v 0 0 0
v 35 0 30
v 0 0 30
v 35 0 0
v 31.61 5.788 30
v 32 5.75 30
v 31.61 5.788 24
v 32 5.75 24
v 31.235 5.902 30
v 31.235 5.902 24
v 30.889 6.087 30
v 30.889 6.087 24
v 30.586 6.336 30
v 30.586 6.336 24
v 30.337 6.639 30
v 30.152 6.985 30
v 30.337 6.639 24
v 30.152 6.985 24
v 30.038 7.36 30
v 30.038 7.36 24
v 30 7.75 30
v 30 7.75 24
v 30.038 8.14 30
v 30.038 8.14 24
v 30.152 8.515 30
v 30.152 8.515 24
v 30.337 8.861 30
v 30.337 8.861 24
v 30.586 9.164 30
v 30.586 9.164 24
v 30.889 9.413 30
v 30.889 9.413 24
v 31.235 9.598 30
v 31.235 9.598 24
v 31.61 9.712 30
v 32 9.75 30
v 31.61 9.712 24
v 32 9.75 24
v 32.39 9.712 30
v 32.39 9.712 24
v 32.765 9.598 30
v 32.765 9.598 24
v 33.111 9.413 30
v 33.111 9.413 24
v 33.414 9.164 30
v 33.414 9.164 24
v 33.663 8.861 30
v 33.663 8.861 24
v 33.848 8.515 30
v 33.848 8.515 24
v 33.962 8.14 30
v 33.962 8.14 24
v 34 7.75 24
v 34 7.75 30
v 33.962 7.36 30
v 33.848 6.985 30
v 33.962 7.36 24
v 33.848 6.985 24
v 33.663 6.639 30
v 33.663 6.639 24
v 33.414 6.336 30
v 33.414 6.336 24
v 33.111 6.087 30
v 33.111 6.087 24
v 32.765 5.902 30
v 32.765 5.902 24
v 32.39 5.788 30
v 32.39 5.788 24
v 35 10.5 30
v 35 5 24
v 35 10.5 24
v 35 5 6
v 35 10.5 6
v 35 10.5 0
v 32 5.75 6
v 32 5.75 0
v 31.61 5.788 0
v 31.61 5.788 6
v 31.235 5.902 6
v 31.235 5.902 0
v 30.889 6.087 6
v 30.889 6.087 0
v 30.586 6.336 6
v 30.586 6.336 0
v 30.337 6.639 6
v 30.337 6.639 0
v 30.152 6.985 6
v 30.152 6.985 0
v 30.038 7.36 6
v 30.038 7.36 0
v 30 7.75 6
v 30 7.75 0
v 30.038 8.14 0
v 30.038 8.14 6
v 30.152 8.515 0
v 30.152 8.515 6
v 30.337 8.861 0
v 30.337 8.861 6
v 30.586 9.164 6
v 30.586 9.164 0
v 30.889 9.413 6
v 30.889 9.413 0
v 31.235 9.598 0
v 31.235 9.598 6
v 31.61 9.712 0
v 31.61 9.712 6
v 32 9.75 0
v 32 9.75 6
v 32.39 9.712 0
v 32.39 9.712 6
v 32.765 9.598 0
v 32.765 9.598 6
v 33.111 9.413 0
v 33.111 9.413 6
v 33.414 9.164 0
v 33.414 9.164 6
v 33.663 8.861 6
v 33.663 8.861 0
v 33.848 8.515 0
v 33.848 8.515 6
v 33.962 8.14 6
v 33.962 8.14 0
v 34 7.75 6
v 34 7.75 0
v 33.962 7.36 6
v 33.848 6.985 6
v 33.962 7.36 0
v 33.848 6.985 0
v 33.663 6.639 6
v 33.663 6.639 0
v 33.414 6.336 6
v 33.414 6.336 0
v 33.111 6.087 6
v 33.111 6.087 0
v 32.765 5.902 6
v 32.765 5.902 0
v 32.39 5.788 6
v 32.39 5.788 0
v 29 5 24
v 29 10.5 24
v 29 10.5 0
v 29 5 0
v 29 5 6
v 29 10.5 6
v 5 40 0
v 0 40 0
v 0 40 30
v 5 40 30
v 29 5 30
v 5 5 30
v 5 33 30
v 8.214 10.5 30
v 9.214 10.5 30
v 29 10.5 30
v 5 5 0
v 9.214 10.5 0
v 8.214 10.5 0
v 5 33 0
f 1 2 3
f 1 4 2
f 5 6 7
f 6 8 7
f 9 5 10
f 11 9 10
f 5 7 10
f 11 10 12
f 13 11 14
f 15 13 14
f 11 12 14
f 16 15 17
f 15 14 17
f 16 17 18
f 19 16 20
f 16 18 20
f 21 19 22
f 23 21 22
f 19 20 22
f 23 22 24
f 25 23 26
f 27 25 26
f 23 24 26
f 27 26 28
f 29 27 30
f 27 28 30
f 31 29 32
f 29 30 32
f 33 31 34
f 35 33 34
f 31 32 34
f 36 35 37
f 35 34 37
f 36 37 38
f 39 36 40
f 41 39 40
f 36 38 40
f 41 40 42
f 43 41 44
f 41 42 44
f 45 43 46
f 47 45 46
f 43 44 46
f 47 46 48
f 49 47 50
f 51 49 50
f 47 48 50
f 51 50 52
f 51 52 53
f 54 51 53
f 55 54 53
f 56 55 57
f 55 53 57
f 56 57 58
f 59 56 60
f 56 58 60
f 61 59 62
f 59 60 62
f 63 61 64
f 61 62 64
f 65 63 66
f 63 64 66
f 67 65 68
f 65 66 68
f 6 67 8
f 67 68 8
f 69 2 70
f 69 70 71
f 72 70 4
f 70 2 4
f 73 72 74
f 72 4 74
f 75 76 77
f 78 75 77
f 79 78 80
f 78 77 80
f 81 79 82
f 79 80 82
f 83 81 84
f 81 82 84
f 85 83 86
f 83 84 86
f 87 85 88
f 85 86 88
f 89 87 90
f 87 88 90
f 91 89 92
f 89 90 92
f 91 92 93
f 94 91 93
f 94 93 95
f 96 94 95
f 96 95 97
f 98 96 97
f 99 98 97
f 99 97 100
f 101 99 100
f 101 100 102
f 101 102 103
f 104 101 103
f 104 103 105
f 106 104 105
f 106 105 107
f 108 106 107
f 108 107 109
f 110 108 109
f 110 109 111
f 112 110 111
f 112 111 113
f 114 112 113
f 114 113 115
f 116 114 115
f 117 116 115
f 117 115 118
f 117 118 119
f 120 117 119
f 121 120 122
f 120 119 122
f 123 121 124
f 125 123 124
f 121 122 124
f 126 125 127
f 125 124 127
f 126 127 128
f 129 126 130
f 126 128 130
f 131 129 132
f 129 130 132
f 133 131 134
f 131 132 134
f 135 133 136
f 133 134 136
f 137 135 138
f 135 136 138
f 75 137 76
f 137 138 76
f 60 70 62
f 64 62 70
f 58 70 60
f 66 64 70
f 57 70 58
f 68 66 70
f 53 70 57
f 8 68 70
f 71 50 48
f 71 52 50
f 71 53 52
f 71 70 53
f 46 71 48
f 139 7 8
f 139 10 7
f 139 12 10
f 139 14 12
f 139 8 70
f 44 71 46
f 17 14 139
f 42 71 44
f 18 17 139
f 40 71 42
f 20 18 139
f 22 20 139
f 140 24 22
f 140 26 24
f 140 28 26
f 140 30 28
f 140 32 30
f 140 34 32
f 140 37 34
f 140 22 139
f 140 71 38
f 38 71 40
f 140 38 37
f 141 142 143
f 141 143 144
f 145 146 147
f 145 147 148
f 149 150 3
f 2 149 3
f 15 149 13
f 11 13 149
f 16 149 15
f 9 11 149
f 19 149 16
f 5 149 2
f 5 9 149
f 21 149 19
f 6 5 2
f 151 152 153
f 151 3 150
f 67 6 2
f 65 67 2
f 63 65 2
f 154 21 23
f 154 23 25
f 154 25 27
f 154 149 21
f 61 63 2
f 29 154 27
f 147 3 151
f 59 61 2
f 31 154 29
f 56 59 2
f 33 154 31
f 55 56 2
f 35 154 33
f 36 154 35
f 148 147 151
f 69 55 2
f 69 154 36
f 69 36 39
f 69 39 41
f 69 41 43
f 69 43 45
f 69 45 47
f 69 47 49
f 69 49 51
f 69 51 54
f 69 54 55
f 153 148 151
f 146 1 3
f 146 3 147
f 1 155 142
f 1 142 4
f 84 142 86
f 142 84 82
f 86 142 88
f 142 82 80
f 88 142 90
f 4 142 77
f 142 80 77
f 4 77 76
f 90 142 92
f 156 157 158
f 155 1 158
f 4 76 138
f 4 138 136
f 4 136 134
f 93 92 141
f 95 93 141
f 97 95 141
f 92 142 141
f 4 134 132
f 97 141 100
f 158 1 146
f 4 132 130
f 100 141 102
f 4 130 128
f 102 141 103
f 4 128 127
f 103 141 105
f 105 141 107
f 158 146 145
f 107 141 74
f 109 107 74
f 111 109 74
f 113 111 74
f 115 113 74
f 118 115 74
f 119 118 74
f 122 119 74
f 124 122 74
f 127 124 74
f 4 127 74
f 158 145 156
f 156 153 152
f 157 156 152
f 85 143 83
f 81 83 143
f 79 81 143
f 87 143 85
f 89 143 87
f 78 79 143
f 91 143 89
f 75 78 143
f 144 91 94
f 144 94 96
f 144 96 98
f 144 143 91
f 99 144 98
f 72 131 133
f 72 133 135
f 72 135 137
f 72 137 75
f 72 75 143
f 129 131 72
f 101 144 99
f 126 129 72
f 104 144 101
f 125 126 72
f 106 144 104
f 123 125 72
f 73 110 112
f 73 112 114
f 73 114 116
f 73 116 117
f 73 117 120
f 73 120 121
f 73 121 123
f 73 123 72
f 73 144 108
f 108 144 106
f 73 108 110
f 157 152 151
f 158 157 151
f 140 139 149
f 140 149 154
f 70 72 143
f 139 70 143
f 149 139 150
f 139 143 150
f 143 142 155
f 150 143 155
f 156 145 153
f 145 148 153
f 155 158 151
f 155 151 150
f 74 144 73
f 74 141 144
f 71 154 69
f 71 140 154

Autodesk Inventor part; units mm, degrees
ref_plane "YZ Plane" through (0, 0, 0) normal (1, 0, 0) x (0, 1, 0)
ref_plane "XZ Plane" through (0, 0, 0) normal (0, 1, 0) x (-1, 0, 0)
ref_plane "XY Plane" through (0, 0, 0) normal (0, 0, 1) x (1, 0, 0)
sketch "Sketch1" plane through (0, 0, 0) normal (0, 0, 1) x (1, 0, 0)
  line L0 (0, 40) -> (5, 40)
  line L1 (5, 40) -> (5, 0)
  line L2 (5, 0) -> (0, 0)
  line L3 (0, 0) -> (0, 40)
  line L4 (5, 0) -> (35, 0)
  line L5 (35, 0) -> (35, 5)
  line L6 (35, 5) -> (5, 5)
  line L7 (5, 5) -> (5, 0)
  line L8 (35, 5) -> (29, 5)
  line L9 (29, 5) -> (29, 10.5)
  line L10 (29, 10.5) -> (35, 10.5)
  line L11 (35, 10.5) -> (35, 5)
  dimension "d0" = 5
  dimension "d1" = 5
  dimension "d2" = 30
  dimension "d4" = 35
  dimension "d7" = 5.5
  dimension "d8" = 6
extrude "Extrusion1" add sketch "Sketch1" along normal blind 30
sketch "Sketch2" plane through (0, 0, 30) normal (0, 0, 1) x (1, 0, 0)
  line L0 (35, 0) -> (35, 10.5) projected
  line L1 (35, 10.5) -> (29, 10.5) projected
  line L2 (29, 10.5) -> (29, 5) projected
  line L3 (29, 5) -> (5, 5) projected
  line L4 (5, 5) -> (5, 40) projected
  line L5 (5, 40) -> (0, 40) projected
  line L6 (0, 40) -> (0, 0) projected
  line L7 (0, 0) -> (35, 0) projected
  line L8 (5, 40) -> (9.2143, 10.5)
  line L9 (9.2143, 10.5) -> (8.2143, 10.5)
  line L10 (8.2143, 10.5) -> (5, 33)
  line L11 (5, 5) -> (5, 40) projected
  line L12 (5, 40) -> (5, 33)
  point P0 (8.7143, 10.5)
  point P1 (32, 10.5)
  dimension "d9" = 1
  dimension "d10" = 7
extrude "Extrusion2" add sketch "Sketch2" against normal up to surface (30 mm away) contours L8 L9 L10 L4
sketch "Sketch3" plane through (0, 0, 30) normal (0, 0, 1) x (1, 0, 0)
  line L0 (35, 0) -> (35, 10.5) projected
  line L1 (35, 10.5) -> (29, 10.5) projected
  line L2 (29, 10.5) -> (29, 5) projected
  line L3 (29, 5) -> (5, 5) projected
  line L4 (5, 5) -> (5, 33) projected
  line L5 (5, 33) -> (8.2143, 10.5) projected
  line L6 (8.2143, 10.5) -> (9.2143, 10.5) projected
  line L7 (9.2143, 10.5) -> (5, 40) projected
  line L8 (5, 40) -> (0, 40) projected
  line L9 (0, 40) -> (0, 0) projected
  line L10 (0, 0) -> (35, 0) projected
  point P0 (32, 7.75)
  point P1 (29, 7.75)
  point P2 (32, 10.5)
hole "Hole1" at (32, 7.75, 30) direction (0, 0, -1) diameter 4 end through all
sketch "Sketch4" plane through (29, 10.5, 0) normal (0, 1, 0) x (1, 0, 0)
  line L0 (6, 0) -> (0, 0) projected
  line L1 (0, 0) -> (0, -30) projected
  line L2 (6, -30) -> (0, -30) projected
  line L3 (6, 0) -> (6, -30) projected
  line L4 (0, 0) -> (0, -30) projected
  line L5 (6, 0) -> (6, -30) projected
  line L6 (0, -6) -> (6, -6)
  line L7 (6, -6) -> (6, -24)
  line L8 (6, -24) -> (0, -24)
  line L9 (0, -24) -> (0, -6)
  point P0 (-29, 0)
  dimension "d20" = 6
  dimension "d21" = 6
extrude "Extrusion3" cut sketch "Sketch4" against normal up to surface (5.5 mm away) contours L3 L8 L1 L6
equation "\"d21\" = d20"
properties part number "gpsFrame"
